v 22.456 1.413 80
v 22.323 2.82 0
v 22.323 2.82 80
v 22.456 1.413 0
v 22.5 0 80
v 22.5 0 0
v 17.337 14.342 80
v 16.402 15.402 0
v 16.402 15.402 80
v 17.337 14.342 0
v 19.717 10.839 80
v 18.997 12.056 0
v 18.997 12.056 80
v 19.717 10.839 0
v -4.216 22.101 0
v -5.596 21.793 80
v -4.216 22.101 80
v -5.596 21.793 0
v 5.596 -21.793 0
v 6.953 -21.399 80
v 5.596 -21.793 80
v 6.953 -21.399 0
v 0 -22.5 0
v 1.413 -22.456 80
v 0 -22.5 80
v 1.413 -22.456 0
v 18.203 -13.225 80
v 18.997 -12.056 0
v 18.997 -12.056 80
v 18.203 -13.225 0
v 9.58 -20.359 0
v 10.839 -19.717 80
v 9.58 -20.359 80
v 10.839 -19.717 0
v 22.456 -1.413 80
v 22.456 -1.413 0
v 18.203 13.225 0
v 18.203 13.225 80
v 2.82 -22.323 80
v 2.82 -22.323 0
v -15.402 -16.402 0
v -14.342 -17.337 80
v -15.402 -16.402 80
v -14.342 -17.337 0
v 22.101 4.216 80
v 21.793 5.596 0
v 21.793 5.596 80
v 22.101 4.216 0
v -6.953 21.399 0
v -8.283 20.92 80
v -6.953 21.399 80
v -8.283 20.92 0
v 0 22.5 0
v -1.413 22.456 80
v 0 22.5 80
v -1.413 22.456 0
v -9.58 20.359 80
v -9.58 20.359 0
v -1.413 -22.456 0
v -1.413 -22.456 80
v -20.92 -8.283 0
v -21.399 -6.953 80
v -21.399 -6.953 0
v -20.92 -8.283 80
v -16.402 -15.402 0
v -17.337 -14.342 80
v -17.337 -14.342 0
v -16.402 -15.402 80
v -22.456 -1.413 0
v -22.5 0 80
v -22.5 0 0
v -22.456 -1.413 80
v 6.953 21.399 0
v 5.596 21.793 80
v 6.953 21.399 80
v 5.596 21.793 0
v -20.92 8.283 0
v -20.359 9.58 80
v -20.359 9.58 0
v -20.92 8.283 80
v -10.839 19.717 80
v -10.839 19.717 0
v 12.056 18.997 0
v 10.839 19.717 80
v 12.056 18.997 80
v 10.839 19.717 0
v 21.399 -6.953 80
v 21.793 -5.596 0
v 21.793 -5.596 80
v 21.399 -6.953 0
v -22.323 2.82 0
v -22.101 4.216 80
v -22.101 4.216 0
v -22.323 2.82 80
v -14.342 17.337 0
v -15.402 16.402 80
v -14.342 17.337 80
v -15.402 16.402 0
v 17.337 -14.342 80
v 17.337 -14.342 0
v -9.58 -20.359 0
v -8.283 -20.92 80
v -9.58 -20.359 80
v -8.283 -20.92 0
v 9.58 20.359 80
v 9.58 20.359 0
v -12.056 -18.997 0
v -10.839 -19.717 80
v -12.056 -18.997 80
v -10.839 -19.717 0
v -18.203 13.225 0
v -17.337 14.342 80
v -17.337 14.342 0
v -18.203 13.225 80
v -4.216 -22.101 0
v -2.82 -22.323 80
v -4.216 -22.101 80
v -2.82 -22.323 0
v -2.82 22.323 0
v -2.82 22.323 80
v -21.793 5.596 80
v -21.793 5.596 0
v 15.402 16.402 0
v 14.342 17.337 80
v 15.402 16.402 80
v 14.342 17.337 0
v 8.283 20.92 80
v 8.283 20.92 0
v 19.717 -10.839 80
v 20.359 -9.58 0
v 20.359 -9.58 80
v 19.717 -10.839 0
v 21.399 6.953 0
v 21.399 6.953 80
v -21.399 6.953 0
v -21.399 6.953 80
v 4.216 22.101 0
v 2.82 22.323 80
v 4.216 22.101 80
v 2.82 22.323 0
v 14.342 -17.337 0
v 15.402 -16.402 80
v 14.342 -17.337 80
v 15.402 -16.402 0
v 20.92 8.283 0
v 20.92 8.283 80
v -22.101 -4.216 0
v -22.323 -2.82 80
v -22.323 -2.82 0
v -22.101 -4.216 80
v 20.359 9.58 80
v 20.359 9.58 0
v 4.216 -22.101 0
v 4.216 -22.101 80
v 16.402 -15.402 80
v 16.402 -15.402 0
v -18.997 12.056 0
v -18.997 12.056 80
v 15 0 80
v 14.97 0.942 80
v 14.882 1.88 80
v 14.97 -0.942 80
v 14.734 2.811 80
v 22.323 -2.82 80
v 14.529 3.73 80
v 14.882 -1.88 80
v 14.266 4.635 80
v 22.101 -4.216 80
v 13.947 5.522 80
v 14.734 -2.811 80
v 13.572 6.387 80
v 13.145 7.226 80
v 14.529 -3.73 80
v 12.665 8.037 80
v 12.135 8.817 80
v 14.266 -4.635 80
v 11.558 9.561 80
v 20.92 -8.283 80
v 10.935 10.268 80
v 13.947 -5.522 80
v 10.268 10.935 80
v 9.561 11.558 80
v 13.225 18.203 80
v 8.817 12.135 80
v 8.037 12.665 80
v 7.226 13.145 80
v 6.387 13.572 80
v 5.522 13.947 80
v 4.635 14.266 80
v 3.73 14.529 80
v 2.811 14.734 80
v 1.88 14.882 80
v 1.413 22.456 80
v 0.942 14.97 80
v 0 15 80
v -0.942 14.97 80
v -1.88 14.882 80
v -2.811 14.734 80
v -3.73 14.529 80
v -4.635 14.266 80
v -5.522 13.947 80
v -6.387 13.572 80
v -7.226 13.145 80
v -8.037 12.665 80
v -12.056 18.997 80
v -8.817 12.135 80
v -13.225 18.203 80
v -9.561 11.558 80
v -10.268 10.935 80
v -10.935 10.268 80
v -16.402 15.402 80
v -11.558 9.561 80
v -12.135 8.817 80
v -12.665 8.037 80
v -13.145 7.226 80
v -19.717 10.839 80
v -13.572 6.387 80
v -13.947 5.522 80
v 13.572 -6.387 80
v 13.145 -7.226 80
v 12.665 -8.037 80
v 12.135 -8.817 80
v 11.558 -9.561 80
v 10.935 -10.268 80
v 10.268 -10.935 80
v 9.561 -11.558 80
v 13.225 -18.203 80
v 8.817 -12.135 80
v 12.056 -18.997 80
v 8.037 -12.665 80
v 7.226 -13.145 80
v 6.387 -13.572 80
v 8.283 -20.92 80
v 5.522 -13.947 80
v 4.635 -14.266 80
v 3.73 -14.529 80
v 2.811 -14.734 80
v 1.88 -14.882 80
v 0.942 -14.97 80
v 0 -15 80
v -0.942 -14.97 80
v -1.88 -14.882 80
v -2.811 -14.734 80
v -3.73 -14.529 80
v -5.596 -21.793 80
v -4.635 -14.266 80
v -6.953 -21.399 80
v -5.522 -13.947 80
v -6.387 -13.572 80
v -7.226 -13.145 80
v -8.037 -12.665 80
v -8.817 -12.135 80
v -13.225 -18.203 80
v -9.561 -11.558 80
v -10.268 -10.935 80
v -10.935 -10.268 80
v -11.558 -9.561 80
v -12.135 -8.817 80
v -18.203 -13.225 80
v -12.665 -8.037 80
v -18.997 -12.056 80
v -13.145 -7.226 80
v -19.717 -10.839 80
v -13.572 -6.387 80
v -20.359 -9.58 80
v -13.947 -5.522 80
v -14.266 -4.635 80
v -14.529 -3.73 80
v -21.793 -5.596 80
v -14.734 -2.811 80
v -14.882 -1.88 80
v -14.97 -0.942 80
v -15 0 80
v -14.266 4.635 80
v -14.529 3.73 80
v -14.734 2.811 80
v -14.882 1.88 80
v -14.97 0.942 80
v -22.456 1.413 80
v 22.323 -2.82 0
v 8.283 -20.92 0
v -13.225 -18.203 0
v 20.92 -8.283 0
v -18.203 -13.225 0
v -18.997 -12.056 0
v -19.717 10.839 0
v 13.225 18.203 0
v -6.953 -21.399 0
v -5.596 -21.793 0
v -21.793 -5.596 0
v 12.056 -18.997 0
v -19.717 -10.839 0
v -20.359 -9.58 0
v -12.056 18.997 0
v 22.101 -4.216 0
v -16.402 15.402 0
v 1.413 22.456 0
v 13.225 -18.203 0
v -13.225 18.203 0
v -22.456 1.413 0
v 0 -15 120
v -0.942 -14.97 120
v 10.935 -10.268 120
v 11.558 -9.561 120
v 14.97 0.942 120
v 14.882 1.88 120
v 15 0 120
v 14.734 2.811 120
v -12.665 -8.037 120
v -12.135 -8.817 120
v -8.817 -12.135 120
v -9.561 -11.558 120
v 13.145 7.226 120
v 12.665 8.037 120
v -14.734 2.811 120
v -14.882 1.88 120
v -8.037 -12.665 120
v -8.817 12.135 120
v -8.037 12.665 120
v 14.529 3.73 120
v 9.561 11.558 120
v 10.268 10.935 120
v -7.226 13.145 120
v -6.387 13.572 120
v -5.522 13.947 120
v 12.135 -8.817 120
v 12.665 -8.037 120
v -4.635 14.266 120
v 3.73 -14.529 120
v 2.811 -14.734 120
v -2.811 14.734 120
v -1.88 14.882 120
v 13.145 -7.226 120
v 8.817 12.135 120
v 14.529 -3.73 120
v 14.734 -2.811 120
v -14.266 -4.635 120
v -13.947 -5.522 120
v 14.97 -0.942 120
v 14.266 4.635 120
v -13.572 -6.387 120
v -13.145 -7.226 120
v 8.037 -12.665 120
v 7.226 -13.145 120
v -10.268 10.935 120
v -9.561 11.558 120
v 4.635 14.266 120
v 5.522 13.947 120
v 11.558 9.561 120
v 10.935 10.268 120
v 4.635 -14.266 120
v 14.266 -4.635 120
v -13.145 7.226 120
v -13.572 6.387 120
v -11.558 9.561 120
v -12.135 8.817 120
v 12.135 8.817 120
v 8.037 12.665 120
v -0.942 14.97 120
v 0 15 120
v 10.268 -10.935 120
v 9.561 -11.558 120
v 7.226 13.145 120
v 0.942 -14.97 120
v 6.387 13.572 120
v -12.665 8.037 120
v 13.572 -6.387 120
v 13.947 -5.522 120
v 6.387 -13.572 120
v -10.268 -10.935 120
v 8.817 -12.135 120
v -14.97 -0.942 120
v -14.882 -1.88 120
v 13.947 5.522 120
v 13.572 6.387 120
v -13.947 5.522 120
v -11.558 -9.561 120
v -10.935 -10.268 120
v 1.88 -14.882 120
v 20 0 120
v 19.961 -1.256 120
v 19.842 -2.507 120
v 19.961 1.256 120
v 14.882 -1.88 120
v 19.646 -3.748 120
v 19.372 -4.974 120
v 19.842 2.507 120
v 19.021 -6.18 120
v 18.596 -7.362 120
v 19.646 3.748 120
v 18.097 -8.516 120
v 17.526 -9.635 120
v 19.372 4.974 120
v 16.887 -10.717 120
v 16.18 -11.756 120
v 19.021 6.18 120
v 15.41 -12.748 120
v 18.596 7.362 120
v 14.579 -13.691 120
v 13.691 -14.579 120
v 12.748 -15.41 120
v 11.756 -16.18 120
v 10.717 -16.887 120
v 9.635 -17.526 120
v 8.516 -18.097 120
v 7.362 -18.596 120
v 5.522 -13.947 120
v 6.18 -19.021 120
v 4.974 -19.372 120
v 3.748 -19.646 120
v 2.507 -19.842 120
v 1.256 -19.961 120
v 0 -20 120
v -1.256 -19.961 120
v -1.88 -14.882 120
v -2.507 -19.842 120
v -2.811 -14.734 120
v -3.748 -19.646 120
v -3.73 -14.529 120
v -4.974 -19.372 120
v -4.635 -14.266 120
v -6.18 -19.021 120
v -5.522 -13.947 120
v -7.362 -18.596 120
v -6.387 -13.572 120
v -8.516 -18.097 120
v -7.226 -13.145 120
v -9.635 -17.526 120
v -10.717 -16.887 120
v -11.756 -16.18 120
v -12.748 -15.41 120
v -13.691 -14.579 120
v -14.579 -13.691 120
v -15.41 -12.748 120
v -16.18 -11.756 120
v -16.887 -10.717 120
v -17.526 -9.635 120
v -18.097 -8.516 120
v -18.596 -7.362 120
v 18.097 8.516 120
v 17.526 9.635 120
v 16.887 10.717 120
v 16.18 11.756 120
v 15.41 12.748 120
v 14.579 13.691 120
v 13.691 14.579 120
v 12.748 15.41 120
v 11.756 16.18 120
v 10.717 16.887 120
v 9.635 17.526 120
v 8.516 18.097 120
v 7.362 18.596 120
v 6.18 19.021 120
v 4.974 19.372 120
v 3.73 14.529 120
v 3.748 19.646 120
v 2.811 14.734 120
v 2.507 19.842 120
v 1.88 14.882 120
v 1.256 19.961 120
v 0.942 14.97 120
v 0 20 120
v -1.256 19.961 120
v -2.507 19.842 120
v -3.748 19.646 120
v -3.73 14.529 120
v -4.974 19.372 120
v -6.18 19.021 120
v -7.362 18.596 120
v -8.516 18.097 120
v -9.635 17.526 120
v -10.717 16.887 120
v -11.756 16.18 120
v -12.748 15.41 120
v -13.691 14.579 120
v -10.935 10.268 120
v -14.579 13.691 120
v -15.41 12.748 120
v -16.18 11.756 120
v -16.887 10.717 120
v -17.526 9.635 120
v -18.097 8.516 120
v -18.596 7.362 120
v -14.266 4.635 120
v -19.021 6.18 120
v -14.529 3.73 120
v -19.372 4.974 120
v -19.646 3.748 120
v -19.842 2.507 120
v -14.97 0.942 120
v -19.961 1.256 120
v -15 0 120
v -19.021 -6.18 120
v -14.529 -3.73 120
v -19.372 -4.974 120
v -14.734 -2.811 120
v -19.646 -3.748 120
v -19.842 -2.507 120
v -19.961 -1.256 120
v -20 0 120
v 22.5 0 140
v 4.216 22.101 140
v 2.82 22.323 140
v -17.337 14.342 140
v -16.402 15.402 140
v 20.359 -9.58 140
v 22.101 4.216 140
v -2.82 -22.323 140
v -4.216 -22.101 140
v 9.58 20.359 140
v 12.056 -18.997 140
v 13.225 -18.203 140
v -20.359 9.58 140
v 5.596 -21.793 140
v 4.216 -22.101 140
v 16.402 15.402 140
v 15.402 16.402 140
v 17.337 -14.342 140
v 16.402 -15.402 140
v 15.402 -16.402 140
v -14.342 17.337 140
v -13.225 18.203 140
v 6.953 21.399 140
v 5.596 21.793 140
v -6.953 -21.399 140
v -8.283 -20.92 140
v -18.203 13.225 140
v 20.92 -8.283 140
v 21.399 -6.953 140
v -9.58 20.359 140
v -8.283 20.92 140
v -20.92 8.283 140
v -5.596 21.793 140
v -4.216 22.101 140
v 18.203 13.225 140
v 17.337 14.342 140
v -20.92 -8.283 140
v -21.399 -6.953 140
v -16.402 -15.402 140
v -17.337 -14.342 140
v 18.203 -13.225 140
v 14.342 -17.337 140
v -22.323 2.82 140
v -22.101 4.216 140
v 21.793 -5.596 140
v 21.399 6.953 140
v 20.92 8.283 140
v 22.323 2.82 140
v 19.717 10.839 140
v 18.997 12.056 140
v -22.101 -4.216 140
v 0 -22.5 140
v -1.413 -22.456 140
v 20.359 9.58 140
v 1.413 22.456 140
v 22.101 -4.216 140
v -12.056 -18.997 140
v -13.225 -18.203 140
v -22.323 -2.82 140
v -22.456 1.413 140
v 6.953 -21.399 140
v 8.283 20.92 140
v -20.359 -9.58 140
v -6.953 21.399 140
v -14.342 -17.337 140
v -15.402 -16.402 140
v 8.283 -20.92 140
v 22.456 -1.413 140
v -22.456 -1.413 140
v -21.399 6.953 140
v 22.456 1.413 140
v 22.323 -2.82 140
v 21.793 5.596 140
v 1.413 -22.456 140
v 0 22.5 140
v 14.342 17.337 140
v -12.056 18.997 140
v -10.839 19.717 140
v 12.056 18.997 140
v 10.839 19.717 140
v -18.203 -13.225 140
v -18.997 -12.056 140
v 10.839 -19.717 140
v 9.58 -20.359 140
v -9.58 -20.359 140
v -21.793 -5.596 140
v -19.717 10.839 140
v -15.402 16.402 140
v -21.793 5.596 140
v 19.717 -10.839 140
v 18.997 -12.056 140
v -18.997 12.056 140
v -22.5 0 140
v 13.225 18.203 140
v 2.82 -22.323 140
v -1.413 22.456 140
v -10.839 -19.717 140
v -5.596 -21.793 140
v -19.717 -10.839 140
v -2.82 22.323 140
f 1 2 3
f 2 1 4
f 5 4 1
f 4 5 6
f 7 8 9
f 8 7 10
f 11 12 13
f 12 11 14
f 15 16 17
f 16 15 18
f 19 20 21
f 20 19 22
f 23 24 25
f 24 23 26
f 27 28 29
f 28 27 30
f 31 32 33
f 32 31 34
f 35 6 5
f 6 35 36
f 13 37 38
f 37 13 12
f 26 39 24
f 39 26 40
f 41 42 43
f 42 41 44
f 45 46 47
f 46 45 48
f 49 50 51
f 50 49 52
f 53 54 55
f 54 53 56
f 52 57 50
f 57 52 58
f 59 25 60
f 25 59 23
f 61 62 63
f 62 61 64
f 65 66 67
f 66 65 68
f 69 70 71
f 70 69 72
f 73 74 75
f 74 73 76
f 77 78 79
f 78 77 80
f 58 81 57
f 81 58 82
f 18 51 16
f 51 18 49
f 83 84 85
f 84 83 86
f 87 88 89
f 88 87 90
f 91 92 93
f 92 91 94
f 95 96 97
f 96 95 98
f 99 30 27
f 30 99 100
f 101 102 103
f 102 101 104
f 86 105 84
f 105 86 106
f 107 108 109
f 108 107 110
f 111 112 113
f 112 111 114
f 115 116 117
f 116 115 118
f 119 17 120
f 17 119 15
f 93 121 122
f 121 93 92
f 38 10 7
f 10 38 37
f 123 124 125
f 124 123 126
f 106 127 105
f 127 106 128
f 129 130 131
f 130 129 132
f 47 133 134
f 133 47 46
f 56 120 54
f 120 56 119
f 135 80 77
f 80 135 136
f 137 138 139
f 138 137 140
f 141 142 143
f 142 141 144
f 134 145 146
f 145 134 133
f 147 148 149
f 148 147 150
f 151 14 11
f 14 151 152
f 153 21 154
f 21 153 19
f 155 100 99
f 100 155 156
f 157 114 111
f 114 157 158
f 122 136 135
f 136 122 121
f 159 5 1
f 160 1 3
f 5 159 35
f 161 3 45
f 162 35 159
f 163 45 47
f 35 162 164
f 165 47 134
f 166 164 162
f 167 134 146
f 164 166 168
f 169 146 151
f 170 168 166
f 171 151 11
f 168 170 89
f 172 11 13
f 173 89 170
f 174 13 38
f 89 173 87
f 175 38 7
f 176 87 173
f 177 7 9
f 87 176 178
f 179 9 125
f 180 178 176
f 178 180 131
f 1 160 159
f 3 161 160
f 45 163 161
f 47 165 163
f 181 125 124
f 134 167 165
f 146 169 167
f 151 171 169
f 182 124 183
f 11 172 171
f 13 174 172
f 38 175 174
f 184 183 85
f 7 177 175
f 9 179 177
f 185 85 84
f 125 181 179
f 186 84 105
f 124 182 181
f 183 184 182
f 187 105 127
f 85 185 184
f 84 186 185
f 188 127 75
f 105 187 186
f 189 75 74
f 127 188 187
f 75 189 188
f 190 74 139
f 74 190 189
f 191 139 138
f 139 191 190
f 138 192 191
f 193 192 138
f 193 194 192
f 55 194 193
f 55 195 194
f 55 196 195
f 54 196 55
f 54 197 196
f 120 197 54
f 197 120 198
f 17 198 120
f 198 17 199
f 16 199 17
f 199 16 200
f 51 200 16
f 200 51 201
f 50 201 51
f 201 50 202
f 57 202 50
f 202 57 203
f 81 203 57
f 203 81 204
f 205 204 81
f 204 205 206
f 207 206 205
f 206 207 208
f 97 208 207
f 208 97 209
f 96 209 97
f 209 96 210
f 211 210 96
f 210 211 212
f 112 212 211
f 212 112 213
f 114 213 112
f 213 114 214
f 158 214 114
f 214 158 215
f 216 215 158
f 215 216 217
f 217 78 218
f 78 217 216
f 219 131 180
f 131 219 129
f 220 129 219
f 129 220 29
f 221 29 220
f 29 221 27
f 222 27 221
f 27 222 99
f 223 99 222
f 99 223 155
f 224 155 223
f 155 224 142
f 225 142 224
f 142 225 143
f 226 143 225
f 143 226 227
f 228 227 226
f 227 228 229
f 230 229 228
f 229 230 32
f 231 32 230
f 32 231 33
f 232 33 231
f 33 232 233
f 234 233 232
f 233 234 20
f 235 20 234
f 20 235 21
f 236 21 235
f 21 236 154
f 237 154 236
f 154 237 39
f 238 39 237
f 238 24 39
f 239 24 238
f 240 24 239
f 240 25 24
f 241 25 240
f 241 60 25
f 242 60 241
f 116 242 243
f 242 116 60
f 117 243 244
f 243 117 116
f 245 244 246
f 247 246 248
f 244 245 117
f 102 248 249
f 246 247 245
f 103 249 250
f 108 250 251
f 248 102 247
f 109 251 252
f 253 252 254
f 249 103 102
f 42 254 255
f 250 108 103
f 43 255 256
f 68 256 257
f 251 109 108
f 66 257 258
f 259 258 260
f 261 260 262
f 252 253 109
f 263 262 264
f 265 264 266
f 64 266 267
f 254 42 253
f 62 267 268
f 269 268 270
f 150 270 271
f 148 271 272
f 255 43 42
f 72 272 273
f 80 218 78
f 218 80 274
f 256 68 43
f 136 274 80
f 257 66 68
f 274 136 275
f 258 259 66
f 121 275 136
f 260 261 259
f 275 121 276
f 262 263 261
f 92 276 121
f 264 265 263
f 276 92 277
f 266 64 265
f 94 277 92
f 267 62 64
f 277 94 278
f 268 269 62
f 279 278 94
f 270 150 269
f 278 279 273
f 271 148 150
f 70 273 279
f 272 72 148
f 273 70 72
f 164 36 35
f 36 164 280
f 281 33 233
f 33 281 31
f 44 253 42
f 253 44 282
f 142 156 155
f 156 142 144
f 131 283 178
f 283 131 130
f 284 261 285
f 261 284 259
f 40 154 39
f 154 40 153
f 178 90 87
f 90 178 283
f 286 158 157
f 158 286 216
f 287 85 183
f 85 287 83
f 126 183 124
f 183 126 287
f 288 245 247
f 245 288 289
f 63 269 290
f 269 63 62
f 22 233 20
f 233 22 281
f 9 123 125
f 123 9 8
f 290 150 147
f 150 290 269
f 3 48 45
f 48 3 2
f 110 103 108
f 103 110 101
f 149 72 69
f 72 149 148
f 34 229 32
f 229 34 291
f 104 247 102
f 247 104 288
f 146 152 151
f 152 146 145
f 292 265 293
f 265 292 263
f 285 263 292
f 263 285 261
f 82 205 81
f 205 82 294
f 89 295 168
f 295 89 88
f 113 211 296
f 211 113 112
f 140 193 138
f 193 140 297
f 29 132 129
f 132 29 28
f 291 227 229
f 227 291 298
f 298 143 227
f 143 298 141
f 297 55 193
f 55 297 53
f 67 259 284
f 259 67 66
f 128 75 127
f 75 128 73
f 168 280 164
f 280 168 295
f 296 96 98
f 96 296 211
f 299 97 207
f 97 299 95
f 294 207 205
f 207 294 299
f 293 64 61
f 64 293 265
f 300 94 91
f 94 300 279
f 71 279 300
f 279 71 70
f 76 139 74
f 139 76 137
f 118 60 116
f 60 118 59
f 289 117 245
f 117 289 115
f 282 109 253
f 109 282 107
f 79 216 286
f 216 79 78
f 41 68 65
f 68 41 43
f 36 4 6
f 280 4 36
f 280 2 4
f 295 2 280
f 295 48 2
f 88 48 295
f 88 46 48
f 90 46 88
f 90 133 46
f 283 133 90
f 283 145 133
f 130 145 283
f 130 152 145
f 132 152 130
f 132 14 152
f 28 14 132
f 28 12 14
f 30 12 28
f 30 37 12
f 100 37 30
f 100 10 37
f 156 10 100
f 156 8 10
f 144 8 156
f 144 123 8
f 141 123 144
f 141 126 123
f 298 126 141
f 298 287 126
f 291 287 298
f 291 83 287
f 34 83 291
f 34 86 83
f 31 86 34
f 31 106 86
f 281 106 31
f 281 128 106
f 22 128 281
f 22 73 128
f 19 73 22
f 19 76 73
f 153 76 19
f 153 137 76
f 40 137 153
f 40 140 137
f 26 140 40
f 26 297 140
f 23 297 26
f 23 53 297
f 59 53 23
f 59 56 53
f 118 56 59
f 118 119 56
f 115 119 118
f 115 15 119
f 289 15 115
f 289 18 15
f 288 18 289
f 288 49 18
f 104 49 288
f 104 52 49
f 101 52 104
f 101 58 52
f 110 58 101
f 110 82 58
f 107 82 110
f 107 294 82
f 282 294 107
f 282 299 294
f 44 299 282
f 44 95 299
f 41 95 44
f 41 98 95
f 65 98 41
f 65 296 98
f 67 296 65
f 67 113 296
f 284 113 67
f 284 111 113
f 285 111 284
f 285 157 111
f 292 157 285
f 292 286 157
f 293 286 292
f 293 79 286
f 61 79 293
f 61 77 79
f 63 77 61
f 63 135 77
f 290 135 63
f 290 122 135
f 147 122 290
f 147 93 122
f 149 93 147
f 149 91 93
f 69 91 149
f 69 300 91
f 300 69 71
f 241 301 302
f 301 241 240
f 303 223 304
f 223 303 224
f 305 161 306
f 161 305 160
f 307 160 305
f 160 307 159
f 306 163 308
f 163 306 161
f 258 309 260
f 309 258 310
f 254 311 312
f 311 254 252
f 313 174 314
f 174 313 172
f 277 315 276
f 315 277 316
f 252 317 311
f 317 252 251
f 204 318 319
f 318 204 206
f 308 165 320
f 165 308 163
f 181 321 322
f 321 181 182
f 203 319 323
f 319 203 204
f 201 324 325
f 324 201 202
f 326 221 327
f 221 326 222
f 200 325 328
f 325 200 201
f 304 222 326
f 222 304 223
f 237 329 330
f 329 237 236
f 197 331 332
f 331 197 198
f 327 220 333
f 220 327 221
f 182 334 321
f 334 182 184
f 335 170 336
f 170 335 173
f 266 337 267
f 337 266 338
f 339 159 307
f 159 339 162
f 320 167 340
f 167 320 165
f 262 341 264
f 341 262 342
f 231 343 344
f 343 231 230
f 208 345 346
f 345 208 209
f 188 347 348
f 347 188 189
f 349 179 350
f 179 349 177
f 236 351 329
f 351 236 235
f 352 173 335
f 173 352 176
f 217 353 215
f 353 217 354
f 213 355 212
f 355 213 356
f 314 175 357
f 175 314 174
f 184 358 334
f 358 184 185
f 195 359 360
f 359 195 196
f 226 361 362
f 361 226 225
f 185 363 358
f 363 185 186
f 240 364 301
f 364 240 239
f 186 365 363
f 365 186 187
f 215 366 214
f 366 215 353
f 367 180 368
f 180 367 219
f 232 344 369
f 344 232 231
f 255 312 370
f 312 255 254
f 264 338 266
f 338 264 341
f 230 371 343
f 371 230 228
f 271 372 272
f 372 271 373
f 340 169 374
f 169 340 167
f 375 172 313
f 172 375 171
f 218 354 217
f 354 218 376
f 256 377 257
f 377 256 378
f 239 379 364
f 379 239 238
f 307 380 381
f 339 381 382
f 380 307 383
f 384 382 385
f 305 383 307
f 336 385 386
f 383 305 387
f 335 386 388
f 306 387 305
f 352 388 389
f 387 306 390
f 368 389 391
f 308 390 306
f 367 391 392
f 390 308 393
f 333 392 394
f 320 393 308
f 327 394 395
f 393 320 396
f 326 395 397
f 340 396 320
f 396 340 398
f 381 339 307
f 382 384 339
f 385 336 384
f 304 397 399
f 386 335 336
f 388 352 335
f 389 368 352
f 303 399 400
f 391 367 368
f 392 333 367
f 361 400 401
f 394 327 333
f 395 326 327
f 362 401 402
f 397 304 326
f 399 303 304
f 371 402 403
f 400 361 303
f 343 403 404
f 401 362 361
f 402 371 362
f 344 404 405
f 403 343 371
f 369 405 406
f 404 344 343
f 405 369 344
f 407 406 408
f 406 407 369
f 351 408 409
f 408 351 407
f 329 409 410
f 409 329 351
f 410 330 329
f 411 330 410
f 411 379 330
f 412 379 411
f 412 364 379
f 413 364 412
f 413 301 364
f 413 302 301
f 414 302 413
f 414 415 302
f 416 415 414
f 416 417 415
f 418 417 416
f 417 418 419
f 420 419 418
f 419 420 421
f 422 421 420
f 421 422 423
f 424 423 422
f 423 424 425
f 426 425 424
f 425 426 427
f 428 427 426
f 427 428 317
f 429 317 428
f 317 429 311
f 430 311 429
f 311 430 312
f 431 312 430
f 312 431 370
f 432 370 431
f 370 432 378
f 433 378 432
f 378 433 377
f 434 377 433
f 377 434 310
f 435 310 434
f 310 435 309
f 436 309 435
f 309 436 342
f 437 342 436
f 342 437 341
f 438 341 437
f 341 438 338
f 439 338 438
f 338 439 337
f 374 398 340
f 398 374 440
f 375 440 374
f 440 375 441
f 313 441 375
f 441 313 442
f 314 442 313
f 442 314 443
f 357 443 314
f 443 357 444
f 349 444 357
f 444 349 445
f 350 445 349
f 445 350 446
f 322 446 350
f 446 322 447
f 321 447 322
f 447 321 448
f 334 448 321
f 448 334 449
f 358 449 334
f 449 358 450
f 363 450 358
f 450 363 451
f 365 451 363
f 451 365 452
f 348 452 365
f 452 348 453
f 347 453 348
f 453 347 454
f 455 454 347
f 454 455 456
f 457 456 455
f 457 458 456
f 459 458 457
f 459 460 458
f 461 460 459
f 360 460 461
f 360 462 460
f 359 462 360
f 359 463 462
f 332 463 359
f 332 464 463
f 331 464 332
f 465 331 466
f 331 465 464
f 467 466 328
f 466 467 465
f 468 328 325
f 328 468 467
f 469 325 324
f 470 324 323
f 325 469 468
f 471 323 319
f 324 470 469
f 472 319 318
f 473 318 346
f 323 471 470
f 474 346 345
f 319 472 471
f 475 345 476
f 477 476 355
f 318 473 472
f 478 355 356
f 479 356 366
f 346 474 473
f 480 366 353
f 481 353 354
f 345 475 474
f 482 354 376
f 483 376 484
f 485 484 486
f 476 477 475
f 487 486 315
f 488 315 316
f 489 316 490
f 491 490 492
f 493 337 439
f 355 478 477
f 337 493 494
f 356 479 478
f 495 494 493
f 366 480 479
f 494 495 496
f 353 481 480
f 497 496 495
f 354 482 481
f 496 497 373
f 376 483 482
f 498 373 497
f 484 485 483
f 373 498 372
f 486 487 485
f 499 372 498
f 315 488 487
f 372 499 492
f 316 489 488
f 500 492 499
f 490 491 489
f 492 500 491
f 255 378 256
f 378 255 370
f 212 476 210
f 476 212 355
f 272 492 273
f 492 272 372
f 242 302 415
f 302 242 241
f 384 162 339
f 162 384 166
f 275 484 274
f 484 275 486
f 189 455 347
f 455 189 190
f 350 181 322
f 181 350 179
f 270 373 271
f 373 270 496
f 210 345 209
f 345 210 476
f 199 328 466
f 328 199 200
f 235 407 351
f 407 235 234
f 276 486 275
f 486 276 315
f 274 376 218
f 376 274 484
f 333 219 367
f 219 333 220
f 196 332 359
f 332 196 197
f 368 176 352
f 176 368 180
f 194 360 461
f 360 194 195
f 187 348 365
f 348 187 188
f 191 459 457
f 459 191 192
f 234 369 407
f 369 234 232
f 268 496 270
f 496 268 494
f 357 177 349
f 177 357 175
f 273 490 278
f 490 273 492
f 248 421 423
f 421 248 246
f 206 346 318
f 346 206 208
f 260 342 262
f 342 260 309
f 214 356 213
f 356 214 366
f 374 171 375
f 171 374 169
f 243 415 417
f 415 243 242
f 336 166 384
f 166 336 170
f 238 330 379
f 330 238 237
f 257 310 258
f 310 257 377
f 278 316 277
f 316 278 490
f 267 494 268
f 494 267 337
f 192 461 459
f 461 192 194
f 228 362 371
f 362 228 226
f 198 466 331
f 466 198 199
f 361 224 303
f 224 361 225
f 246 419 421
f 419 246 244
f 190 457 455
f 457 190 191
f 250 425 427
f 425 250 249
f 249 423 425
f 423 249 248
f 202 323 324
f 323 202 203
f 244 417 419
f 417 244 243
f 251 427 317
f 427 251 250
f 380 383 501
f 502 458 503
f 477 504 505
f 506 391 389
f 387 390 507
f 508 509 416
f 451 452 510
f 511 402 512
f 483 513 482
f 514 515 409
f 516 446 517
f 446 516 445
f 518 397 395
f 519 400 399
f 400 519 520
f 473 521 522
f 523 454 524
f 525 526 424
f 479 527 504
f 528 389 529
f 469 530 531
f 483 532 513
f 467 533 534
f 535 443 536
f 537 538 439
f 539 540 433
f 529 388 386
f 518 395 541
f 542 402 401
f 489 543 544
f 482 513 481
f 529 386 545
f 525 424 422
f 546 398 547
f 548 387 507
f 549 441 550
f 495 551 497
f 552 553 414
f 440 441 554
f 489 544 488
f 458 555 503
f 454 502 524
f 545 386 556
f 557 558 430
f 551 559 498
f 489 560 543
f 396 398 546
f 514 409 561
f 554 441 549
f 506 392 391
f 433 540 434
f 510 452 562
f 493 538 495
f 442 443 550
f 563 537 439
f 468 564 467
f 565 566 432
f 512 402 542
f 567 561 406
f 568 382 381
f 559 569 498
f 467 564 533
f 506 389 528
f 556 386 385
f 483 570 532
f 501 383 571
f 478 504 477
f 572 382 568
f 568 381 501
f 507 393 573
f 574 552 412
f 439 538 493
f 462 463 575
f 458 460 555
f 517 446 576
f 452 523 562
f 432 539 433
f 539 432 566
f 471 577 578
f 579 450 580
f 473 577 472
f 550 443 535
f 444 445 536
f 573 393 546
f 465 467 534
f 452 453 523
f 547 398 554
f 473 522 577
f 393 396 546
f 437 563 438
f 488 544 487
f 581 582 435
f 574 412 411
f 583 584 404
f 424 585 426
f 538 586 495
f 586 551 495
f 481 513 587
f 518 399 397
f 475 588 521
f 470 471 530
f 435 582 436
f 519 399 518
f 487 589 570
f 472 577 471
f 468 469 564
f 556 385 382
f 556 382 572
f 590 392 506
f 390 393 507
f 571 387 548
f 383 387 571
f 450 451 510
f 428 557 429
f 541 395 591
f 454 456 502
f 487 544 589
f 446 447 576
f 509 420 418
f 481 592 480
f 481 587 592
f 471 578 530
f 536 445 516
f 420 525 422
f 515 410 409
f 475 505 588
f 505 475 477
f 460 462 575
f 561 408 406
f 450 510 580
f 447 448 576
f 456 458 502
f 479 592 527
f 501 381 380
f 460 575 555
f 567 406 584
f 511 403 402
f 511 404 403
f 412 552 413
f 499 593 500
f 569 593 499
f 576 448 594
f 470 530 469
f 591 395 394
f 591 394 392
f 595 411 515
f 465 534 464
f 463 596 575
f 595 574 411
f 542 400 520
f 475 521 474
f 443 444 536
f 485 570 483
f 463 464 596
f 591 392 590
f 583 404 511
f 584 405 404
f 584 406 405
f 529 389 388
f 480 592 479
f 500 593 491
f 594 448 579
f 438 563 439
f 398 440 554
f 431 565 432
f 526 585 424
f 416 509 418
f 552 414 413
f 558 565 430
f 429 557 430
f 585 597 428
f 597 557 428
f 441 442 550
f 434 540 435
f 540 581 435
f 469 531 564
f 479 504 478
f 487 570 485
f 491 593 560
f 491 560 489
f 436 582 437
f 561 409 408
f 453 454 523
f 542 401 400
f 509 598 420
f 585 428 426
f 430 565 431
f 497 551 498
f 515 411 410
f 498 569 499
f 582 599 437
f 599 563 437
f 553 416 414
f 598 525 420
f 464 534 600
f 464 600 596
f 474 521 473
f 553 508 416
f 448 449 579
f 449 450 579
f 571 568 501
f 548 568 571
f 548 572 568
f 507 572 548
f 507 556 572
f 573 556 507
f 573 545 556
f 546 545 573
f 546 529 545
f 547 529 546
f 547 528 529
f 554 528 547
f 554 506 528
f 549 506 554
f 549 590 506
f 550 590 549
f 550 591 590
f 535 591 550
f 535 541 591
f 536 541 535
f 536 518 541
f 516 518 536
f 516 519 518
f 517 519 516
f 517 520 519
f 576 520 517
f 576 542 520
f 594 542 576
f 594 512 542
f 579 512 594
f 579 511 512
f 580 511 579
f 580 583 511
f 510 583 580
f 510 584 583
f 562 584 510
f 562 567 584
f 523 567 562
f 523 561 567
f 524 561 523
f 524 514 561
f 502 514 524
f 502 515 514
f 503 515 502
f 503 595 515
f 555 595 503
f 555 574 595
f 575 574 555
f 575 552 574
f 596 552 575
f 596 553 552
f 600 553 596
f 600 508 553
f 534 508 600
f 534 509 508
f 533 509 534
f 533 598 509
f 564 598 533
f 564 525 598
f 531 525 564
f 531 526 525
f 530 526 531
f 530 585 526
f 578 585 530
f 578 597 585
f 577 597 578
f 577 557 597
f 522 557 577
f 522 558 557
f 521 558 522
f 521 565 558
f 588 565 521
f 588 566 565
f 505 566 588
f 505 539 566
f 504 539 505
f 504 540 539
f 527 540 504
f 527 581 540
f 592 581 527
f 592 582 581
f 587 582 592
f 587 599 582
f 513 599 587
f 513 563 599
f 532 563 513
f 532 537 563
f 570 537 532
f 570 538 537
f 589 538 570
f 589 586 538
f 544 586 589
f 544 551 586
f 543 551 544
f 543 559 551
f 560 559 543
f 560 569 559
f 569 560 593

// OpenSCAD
$fn=100;

cylinder(80,d=45);
cylinder(120,d=30);
translate([0,0,120]) cylinder(20, d1=40, d2=45);
